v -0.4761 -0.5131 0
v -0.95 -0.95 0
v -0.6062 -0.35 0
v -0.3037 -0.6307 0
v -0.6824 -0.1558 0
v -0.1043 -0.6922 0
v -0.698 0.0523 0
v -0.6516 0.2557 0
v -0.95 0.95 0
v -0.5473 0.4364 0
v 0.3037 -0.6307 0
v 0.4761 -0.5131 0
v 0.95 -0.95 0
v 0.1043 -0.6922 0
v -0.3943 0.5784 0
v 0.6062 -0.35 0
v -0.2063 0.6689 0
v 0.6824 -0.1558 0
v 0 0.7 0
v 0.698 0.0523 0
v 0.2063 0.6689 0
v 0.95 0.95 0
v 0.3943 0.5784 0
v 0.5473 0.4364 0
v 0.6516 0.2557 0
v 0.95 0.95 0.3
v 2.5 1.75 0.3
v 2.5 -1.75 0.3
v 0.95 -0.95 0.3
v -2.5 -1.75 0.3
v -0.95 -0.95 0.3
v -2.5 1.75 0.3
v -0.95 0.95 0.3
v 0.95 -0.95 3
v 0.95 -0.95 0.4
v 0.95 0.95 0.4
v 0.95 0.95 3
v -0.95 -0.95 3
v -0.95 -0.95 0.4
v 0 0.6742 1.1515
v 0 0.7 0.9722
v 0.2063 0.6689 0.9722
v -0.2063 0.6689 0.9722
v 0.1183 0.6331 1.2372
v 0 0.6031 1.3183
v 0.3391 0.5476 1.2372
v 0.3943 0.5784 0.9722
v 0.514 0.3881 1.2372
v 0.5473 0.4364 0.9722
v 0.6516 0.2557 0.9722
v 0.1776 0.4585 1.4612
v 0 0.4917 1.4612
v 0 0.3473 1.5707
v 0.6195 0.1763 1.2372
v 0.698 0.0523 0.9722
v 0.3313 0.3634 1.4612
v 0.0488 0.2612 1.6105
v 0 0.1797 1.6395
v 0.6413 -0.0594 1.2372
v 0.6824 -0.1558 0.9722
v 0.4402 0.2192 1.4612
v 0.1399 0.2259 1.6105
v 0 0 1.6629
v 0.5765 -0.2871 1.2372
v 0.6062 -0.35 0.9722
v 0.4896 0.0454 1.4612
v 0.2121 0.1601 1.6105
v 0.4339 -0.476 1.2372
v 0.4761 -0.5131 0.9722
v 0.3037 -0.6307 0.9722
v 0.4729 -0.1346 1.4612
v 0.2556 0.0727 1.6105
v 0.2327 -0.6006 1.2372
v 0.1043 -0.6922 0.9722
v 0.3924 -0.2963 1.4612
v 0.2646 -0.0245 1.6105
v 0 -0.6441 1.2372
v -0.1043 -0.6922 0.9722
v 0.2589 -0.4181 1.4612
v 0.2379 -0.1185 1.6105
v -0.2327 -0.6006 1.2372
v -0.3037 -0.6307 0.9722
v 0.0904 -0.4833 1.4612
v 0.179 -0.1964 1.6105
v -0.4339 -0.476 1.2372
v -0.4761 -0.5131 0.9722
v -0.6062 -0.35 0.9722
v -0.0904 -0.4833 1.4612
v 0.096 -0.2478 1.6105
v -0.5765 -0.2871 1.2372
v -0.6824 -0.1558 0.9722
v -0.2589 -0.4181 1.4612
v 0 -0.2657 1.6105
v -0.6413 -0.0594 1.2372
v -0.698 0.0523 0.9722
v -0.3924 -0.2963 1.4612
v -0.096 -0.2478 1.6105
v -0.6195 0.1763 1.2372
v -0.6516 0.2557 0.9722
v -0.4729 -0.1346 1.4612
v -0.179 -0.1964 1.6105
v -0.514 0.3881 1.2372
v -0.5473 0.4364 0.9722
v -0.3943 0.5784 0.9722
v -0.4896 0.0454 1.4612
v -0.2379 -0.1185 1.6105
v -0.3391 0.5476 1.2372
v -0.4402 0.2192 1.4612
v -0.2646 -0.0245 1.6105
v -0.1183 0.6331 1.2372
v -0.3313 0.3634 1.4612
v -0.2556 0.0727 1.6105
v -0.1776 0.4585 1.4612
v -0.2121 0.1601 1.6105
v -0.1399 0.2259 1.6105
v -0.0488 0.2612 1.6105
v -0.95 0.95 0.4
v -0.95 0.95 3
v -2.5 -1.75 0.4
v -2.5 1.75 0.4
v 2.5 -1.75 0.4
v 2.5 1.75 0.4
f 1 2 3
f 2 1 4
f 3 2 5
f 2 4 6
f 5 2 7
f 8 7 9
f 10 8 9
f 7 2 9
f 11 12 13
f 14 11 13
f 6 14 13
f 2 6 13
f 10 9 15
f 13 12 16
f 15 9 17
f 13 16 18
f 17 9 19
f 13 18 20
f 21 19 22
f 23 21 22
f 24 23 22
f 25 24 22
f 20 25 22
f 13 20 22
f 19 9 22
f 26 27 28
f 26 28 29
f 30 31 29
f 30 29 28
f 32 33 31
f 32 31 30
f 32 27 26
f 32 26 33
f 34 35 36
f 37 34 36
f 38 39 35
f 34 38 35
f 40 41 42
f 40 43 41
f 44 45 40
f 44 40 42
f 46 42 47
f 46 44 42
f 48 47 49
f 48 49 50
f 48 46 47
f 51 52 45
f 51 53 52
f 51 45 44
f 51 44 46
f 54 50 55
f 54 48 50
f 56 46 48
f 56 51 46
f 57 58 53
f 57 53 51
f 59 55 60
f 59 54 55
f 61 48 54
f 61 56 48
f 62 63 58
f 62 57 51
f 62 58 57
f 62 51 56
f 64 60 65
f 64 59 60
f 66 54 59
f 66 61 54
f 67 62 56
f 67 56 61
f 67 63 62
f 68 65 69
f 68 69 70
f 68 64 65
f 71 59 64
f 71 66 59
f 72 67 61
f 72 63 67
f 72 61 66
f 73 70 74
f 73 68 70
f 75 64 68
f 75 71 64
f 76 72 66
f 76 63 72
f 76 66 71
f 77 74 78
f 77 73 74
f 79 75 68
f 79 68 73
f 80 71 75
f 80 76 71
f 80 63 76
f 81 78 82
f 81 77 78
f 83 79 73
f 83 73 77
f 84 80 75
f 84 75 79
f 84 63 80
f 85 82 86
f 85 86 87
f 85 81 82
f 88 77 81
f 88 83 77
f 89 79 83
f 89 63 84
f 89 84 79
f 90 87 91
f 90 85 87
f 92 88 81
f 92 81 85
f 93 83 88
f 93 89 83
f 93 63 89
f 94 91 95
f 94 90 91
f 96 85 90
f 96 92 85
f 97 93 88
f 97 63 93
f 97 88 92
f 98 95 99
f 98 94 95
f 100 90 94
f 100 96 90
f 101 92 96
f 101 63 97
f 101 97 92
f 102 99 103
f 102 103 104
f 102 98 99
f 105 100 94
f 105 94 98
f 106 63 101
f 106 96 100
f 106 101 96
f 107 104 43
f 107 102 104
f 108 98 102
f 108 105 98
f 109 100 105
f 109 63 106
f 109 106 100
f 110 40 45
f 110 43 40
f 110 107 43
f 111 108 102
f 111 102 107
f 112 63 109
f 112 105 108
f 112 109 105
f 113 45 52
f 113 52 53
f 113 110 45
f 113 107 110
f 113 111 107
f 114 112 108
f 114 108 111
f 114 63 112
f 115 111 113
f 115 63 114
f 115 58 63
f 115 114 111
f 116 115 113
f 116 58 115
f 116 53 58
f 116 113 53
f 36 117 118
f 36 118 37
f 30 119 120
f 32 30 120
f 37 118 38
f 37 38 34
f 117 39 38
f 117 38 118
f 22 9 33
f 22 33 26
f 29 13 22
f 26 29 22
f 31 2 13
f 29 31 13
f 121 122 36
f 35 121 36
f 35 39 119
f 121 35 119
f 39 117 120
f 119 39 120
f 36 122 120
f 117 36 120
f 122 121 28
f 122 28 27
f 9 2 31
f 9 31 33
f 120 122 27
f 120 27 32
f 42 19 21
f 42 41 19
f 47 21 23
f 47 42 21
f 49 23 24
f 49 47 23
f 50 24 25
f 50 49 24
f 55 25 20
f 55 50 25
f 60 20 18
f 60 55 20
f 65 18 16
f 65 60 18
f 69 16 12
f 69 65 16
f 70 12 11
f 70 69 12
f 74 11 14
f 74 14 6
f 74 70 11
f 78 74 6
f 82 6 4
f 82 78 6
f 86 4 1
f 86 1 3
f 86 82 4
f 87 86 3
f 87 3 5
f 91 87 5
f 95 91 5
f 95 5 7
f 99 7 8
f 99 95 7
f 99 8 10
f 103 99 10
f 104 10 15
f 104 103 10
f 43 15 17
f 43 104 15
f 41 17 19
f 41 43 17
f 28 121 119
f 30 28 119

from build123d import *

# Parameters (mm, degrees)
SKETCH1_W           = 1.9
SKETCH1_H           = 1.9
BOSS_EXTRUDE1_DEPTH = 3
SKETCH4_W           = 5
SKETCH4_H           = 3.5
SKETCH4_W_2         = 1.530066542
SKETCH4_H_2         = 1.473797408
BOSS_EXTRUDE2_DEPTH = 0.1


with BuildPart() as part:
    # Sketch1 → Boss-Extrude1 (new body)
    with BuildSketch(Plane.XY):
        Rectangle(SKETCH1_W, SKETCH1_H)
    extrude(amount=BOSS_EXTRUDE1_DEPTH)

    # Sketch3 → Cut-Revolve1 (revolve, cut)
    with BuildSketch(Plane(origin=(0, 0, 0), x_dir=(0, 0, -1), z_dir=(1, 0, 0))):
        with BuildLine():
            Line((0, 0), (0, 0.7))
            Line((0, 0.7), (-0.972189278, 0.7))
            ThreePointArc((-0.972189278, 0.7), (-1.461166365, 0.49170934), (-1.662922441, 0))
            Line((-1.662922441, 0), (0, 0))
        make_face()
    revolve(axis=Axis((0, 0, 5.25), (0, 0, -1)), mode=Mode.SUBTRACT)

    # Sketch4 → Boss-Extrude2 (add)
    with BuildSketch(Plane(origin=(0, 0, 0.4), x_dir=(-1, 0, 0), z_dir=(0, 0, -1))):
        Rectangle(SKETCH4_W, SKETCH4_H)
        Rectangle(SKETCH4_W_2, SKETCH4_H_2, mode=Mode.SUBTRACT)
    extrude(amount=BOSS_EXTRUDE2_DEPTH)


solid = part.part
